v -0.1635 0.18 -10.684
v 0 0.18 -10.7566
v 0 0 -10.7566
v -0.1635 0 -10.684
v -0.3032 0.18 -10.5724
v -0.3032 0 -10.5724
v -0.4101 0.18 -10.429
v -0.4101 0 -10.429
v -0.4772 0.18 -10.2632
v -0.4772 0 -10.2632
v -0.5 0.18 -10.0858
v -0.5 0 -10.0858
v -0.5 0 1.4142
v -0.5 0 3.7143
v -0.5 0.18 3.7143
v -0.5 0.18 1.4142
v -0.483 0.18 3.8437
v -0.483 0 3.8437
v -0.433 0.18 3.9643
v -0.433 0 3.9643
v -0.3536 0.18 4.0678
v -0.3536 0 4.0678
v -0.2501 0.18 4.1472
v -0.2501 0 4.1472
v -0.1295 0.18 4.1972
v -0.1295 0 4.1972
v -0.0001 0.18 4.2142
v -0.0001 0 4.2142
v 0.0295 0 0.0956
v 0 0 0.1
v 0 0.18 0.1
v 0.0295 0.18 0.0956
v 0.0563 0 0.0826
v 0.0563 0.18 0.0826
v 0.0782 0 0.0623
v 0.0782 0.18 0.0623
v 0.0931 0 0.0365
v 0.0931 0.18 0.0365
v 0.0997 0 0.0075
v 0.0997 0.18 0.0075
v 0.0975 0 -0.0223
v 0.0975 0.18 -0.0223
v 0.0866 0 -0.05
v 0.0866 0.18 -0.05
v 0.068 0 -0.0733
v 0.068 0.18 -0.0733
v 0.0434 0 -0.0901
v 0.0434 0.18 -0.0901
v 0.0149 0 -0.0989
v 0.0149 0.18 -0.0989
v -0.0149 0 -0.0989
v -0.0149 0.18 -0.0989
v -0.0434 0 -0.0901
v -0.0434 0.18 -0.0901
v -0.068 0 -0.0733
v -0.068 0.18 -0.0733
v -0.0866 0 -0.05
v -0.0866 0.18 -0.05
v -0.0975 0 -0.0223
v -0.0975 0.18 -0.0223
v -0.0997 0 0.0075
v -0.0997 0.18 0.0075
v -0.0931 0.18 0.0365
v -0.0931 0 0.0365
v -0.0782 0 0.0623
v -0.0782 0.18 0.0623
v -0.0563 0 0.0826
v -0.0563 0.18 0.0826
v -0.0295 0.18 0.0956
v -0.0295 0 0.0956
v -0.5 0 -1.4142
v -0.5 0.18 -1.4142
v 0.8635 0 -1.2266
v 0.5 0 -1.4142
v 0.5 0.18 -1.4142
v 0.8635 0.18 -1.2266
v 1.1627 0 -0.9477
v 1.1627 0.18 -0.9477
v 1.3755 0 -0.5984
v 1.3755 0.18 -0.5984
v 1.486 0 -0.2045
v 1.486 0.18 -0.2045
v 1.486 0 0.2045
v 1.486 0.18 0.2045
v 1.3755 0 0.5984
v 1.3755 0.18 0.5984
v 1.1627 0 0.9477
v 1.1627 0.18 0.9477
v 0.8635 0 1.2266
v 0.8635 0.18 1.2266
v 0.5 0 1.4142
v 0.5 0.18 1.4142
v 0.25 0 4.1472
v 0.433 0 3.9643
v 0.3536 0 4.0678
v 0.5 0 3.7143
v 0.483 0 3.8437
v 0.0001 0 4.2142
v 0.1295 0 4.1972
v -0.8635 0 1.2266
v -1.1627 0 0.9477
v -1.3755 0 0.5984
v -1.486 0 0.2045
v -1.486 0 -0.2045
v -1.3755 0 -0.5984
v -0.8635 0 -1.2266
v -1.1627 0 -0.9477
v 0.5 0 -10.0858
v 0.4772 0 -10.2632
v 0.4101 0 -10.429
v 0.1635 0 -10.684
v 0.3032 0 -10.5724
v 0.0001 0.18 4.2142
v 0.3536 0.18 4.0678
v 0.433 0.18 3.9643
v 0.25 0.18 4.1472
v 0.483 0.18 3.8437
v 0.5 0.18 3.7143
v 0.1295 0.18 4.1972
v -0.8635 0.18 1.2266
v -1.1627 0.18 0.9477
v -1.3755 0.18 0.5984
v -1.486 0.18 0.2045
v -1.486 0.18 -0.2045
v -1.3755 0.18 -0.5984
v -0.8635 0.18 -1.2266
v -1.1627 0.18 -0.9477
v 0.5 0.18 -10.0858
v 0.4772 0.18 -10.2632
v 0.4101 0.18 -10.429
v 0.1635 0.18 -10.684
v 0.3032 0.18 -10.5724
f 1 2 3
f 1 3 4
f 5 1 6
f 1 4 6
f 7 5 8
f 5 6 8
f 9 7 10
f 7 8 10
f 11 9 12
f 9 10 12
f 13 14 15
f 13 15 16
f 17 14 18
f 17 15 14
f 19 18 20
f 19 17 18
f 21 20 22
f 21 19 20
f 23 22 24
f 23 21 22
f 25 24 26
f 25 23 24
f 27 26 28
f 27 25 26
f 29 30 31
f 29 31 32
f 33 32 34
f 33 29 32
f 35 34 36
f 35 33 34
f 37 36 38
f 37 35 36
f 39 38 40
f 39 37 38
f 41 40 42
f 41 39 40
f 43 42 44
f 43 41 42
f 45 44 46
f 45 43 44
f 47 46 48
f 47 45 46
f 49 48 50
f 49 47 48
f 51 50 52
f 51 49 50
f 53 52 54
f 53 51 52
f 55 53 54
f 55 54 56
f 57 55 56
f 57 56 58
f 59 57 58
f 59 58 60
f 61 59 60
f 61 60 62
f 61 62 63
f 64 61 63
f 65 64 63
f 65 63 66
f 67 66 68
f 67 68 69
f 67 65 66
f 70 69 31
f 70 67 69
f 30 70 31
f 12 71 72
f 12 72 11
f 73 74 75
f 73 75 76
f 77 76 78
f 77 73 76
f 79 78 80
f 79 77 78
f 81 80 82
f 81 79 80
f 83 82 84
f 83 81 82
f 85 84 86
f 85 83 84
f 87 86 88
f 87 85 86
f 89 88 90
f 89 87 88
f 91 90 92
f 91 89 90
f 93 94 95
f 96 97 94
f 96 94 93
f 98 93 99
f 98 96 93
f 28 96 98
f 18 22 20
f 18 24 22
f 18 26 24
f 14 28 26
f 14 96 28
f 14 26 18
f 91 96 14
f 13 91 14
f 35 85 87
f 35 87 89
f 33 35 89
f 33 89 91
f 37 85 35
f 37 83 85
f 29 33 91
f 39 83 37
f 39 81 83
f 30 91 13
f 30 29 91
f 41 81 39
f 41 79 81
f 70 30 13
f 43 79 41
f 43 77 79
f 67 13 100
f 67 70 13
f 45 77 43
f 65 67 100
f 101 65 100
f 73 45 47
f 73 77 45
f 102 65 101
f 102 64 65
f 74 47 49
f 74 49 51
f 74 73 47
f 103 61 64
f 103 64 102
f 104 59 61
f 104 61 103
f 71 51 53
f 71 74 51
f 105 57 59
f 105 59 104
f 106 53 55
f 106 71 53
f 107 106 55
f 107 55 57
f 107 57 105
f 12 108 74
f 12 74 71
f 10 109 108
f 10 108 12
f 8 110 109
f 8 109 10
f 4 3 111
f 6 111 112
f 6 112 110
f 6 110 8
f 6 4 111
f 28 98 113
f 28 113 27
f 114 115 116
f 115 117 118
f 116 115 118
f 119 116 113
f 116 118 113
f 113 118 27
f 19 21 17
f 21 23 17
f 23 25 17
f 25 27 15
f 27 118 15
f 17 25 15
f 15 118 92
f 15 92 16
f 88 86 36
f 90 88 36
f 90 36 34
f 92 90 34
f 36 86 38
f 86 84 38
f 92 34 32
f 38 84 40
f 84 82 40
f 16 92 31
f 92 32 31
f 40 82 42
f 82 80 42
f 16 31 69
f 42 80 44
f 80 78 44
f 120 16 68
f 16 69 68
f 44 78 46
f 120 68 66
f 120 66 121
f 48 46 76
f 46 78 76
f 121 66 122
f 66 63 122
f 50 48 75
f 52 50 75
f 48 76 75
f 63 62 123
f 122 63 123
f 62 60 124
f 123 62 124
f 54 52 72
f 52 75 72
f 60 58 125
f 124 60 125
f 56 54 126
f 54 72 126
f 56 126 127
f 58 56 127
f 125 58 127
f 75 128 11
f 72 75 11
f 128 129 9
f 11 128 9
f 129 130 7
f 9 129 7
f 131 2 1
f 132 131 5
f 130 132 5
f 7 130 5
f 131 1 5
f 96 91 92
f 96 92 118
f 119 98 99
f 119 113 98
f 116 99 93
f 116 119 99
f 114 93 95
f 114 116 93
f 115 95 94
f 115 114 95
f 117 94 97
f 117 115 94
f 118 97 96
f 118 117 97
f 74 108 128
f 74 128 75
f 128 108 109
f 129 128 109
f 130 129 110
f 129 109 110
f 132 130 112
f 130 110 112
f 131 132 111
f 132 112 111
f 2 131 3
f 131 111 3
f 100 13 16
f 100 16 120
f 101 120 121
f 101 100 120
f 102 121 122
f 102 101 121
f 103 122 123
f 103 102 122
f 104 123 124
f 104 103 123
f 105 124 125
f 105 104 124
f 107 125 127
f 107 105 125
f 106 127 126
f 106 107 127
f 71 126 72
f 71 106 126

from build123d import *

# Parameters (mm, degrees)
SKETCH1_R           = 0.1
BOSS_EXTRUDE1_DEPTH = 0.18
FILLET1_R           = 0.5
FILLET2_R           = 0.7


# Some blends are built 0.0001 mm under size
with BuildPart() as part:
    # Sketch1 → Boss-Extrude1 (new body)
    with BuildSketch(Plane(origin=(0, 0, 0), x_dir=(1, 0, 0), z_dir=(0, 1, 0))):
        with BuildLine():
            Line((-0.5, -4.214213562), (-0.5, -1.414213562))
            ThreePointArc((-0.5, -1.414213562), (-1.5, 0), (-0.5, 1.414213562))
            Line((-0.5, 1.414213562), (-0.5, 10.785786438))
            Line((-0.5, 10.785786438), (0.5, 10.785786438))
            Line((0.5, 10.785786438), (0.5, 1.414213562))
            ThreePointArc((0.5, 1.414213562), (1.5, 0), (0.5, -1.414213562))
            Line((0.5, -1.414213562), (0.5, -4.214213562))
            Line((0.5, -4.214213562), (-0.5, -4.214213562))
        make_face()
        with Locations(Location((0, 0, 0), (0, 0, 270))):
            Circle(SKETCH1_R, mode=Mode.SUBTRACT)
    extrude(amount=BOSS_EXTRUDE1_DEPTH)

    # Fillet1
    fillet1_edges = [part.edges().sort_by_distance(p)[0] for p in [
        (-0.5, 0.09, 4.214213562),
        (0.5, 0.09, 4.214213562),
    ]]
    fillet(fillet1_edges, radius=FILLET1_R - 0.0001)  # a hair under: the kernel refuses the full size

    # Fillet2
    # the kernel refuses this fillet: 0.7 mm, written as the material it takes off along each edge
    with BuildSketch(Plane(origin=(-0.5, -1.75, -10.785786438), x_dir=(1, 0, 0), z_dir=(0, 1, 0)), Plane(origin=(0.5, -1.75, -10.785786438), x_dir=(0, 0, 1), z_dir=(0, 1, 0))) as fillet2_piece_1:
        with BuildLine():
            CenterArc((FILLET2_R, -FILLET2_R), FILLET2_R, 90, 90)
            Line((0, -FILLET2_R), (0, 0))
            Line((0, 0), (FILLET2_R, 0))
        make_face()
    extrude(amount=3.68, mode=Mode.SUBTRACT)


solid = part.part
